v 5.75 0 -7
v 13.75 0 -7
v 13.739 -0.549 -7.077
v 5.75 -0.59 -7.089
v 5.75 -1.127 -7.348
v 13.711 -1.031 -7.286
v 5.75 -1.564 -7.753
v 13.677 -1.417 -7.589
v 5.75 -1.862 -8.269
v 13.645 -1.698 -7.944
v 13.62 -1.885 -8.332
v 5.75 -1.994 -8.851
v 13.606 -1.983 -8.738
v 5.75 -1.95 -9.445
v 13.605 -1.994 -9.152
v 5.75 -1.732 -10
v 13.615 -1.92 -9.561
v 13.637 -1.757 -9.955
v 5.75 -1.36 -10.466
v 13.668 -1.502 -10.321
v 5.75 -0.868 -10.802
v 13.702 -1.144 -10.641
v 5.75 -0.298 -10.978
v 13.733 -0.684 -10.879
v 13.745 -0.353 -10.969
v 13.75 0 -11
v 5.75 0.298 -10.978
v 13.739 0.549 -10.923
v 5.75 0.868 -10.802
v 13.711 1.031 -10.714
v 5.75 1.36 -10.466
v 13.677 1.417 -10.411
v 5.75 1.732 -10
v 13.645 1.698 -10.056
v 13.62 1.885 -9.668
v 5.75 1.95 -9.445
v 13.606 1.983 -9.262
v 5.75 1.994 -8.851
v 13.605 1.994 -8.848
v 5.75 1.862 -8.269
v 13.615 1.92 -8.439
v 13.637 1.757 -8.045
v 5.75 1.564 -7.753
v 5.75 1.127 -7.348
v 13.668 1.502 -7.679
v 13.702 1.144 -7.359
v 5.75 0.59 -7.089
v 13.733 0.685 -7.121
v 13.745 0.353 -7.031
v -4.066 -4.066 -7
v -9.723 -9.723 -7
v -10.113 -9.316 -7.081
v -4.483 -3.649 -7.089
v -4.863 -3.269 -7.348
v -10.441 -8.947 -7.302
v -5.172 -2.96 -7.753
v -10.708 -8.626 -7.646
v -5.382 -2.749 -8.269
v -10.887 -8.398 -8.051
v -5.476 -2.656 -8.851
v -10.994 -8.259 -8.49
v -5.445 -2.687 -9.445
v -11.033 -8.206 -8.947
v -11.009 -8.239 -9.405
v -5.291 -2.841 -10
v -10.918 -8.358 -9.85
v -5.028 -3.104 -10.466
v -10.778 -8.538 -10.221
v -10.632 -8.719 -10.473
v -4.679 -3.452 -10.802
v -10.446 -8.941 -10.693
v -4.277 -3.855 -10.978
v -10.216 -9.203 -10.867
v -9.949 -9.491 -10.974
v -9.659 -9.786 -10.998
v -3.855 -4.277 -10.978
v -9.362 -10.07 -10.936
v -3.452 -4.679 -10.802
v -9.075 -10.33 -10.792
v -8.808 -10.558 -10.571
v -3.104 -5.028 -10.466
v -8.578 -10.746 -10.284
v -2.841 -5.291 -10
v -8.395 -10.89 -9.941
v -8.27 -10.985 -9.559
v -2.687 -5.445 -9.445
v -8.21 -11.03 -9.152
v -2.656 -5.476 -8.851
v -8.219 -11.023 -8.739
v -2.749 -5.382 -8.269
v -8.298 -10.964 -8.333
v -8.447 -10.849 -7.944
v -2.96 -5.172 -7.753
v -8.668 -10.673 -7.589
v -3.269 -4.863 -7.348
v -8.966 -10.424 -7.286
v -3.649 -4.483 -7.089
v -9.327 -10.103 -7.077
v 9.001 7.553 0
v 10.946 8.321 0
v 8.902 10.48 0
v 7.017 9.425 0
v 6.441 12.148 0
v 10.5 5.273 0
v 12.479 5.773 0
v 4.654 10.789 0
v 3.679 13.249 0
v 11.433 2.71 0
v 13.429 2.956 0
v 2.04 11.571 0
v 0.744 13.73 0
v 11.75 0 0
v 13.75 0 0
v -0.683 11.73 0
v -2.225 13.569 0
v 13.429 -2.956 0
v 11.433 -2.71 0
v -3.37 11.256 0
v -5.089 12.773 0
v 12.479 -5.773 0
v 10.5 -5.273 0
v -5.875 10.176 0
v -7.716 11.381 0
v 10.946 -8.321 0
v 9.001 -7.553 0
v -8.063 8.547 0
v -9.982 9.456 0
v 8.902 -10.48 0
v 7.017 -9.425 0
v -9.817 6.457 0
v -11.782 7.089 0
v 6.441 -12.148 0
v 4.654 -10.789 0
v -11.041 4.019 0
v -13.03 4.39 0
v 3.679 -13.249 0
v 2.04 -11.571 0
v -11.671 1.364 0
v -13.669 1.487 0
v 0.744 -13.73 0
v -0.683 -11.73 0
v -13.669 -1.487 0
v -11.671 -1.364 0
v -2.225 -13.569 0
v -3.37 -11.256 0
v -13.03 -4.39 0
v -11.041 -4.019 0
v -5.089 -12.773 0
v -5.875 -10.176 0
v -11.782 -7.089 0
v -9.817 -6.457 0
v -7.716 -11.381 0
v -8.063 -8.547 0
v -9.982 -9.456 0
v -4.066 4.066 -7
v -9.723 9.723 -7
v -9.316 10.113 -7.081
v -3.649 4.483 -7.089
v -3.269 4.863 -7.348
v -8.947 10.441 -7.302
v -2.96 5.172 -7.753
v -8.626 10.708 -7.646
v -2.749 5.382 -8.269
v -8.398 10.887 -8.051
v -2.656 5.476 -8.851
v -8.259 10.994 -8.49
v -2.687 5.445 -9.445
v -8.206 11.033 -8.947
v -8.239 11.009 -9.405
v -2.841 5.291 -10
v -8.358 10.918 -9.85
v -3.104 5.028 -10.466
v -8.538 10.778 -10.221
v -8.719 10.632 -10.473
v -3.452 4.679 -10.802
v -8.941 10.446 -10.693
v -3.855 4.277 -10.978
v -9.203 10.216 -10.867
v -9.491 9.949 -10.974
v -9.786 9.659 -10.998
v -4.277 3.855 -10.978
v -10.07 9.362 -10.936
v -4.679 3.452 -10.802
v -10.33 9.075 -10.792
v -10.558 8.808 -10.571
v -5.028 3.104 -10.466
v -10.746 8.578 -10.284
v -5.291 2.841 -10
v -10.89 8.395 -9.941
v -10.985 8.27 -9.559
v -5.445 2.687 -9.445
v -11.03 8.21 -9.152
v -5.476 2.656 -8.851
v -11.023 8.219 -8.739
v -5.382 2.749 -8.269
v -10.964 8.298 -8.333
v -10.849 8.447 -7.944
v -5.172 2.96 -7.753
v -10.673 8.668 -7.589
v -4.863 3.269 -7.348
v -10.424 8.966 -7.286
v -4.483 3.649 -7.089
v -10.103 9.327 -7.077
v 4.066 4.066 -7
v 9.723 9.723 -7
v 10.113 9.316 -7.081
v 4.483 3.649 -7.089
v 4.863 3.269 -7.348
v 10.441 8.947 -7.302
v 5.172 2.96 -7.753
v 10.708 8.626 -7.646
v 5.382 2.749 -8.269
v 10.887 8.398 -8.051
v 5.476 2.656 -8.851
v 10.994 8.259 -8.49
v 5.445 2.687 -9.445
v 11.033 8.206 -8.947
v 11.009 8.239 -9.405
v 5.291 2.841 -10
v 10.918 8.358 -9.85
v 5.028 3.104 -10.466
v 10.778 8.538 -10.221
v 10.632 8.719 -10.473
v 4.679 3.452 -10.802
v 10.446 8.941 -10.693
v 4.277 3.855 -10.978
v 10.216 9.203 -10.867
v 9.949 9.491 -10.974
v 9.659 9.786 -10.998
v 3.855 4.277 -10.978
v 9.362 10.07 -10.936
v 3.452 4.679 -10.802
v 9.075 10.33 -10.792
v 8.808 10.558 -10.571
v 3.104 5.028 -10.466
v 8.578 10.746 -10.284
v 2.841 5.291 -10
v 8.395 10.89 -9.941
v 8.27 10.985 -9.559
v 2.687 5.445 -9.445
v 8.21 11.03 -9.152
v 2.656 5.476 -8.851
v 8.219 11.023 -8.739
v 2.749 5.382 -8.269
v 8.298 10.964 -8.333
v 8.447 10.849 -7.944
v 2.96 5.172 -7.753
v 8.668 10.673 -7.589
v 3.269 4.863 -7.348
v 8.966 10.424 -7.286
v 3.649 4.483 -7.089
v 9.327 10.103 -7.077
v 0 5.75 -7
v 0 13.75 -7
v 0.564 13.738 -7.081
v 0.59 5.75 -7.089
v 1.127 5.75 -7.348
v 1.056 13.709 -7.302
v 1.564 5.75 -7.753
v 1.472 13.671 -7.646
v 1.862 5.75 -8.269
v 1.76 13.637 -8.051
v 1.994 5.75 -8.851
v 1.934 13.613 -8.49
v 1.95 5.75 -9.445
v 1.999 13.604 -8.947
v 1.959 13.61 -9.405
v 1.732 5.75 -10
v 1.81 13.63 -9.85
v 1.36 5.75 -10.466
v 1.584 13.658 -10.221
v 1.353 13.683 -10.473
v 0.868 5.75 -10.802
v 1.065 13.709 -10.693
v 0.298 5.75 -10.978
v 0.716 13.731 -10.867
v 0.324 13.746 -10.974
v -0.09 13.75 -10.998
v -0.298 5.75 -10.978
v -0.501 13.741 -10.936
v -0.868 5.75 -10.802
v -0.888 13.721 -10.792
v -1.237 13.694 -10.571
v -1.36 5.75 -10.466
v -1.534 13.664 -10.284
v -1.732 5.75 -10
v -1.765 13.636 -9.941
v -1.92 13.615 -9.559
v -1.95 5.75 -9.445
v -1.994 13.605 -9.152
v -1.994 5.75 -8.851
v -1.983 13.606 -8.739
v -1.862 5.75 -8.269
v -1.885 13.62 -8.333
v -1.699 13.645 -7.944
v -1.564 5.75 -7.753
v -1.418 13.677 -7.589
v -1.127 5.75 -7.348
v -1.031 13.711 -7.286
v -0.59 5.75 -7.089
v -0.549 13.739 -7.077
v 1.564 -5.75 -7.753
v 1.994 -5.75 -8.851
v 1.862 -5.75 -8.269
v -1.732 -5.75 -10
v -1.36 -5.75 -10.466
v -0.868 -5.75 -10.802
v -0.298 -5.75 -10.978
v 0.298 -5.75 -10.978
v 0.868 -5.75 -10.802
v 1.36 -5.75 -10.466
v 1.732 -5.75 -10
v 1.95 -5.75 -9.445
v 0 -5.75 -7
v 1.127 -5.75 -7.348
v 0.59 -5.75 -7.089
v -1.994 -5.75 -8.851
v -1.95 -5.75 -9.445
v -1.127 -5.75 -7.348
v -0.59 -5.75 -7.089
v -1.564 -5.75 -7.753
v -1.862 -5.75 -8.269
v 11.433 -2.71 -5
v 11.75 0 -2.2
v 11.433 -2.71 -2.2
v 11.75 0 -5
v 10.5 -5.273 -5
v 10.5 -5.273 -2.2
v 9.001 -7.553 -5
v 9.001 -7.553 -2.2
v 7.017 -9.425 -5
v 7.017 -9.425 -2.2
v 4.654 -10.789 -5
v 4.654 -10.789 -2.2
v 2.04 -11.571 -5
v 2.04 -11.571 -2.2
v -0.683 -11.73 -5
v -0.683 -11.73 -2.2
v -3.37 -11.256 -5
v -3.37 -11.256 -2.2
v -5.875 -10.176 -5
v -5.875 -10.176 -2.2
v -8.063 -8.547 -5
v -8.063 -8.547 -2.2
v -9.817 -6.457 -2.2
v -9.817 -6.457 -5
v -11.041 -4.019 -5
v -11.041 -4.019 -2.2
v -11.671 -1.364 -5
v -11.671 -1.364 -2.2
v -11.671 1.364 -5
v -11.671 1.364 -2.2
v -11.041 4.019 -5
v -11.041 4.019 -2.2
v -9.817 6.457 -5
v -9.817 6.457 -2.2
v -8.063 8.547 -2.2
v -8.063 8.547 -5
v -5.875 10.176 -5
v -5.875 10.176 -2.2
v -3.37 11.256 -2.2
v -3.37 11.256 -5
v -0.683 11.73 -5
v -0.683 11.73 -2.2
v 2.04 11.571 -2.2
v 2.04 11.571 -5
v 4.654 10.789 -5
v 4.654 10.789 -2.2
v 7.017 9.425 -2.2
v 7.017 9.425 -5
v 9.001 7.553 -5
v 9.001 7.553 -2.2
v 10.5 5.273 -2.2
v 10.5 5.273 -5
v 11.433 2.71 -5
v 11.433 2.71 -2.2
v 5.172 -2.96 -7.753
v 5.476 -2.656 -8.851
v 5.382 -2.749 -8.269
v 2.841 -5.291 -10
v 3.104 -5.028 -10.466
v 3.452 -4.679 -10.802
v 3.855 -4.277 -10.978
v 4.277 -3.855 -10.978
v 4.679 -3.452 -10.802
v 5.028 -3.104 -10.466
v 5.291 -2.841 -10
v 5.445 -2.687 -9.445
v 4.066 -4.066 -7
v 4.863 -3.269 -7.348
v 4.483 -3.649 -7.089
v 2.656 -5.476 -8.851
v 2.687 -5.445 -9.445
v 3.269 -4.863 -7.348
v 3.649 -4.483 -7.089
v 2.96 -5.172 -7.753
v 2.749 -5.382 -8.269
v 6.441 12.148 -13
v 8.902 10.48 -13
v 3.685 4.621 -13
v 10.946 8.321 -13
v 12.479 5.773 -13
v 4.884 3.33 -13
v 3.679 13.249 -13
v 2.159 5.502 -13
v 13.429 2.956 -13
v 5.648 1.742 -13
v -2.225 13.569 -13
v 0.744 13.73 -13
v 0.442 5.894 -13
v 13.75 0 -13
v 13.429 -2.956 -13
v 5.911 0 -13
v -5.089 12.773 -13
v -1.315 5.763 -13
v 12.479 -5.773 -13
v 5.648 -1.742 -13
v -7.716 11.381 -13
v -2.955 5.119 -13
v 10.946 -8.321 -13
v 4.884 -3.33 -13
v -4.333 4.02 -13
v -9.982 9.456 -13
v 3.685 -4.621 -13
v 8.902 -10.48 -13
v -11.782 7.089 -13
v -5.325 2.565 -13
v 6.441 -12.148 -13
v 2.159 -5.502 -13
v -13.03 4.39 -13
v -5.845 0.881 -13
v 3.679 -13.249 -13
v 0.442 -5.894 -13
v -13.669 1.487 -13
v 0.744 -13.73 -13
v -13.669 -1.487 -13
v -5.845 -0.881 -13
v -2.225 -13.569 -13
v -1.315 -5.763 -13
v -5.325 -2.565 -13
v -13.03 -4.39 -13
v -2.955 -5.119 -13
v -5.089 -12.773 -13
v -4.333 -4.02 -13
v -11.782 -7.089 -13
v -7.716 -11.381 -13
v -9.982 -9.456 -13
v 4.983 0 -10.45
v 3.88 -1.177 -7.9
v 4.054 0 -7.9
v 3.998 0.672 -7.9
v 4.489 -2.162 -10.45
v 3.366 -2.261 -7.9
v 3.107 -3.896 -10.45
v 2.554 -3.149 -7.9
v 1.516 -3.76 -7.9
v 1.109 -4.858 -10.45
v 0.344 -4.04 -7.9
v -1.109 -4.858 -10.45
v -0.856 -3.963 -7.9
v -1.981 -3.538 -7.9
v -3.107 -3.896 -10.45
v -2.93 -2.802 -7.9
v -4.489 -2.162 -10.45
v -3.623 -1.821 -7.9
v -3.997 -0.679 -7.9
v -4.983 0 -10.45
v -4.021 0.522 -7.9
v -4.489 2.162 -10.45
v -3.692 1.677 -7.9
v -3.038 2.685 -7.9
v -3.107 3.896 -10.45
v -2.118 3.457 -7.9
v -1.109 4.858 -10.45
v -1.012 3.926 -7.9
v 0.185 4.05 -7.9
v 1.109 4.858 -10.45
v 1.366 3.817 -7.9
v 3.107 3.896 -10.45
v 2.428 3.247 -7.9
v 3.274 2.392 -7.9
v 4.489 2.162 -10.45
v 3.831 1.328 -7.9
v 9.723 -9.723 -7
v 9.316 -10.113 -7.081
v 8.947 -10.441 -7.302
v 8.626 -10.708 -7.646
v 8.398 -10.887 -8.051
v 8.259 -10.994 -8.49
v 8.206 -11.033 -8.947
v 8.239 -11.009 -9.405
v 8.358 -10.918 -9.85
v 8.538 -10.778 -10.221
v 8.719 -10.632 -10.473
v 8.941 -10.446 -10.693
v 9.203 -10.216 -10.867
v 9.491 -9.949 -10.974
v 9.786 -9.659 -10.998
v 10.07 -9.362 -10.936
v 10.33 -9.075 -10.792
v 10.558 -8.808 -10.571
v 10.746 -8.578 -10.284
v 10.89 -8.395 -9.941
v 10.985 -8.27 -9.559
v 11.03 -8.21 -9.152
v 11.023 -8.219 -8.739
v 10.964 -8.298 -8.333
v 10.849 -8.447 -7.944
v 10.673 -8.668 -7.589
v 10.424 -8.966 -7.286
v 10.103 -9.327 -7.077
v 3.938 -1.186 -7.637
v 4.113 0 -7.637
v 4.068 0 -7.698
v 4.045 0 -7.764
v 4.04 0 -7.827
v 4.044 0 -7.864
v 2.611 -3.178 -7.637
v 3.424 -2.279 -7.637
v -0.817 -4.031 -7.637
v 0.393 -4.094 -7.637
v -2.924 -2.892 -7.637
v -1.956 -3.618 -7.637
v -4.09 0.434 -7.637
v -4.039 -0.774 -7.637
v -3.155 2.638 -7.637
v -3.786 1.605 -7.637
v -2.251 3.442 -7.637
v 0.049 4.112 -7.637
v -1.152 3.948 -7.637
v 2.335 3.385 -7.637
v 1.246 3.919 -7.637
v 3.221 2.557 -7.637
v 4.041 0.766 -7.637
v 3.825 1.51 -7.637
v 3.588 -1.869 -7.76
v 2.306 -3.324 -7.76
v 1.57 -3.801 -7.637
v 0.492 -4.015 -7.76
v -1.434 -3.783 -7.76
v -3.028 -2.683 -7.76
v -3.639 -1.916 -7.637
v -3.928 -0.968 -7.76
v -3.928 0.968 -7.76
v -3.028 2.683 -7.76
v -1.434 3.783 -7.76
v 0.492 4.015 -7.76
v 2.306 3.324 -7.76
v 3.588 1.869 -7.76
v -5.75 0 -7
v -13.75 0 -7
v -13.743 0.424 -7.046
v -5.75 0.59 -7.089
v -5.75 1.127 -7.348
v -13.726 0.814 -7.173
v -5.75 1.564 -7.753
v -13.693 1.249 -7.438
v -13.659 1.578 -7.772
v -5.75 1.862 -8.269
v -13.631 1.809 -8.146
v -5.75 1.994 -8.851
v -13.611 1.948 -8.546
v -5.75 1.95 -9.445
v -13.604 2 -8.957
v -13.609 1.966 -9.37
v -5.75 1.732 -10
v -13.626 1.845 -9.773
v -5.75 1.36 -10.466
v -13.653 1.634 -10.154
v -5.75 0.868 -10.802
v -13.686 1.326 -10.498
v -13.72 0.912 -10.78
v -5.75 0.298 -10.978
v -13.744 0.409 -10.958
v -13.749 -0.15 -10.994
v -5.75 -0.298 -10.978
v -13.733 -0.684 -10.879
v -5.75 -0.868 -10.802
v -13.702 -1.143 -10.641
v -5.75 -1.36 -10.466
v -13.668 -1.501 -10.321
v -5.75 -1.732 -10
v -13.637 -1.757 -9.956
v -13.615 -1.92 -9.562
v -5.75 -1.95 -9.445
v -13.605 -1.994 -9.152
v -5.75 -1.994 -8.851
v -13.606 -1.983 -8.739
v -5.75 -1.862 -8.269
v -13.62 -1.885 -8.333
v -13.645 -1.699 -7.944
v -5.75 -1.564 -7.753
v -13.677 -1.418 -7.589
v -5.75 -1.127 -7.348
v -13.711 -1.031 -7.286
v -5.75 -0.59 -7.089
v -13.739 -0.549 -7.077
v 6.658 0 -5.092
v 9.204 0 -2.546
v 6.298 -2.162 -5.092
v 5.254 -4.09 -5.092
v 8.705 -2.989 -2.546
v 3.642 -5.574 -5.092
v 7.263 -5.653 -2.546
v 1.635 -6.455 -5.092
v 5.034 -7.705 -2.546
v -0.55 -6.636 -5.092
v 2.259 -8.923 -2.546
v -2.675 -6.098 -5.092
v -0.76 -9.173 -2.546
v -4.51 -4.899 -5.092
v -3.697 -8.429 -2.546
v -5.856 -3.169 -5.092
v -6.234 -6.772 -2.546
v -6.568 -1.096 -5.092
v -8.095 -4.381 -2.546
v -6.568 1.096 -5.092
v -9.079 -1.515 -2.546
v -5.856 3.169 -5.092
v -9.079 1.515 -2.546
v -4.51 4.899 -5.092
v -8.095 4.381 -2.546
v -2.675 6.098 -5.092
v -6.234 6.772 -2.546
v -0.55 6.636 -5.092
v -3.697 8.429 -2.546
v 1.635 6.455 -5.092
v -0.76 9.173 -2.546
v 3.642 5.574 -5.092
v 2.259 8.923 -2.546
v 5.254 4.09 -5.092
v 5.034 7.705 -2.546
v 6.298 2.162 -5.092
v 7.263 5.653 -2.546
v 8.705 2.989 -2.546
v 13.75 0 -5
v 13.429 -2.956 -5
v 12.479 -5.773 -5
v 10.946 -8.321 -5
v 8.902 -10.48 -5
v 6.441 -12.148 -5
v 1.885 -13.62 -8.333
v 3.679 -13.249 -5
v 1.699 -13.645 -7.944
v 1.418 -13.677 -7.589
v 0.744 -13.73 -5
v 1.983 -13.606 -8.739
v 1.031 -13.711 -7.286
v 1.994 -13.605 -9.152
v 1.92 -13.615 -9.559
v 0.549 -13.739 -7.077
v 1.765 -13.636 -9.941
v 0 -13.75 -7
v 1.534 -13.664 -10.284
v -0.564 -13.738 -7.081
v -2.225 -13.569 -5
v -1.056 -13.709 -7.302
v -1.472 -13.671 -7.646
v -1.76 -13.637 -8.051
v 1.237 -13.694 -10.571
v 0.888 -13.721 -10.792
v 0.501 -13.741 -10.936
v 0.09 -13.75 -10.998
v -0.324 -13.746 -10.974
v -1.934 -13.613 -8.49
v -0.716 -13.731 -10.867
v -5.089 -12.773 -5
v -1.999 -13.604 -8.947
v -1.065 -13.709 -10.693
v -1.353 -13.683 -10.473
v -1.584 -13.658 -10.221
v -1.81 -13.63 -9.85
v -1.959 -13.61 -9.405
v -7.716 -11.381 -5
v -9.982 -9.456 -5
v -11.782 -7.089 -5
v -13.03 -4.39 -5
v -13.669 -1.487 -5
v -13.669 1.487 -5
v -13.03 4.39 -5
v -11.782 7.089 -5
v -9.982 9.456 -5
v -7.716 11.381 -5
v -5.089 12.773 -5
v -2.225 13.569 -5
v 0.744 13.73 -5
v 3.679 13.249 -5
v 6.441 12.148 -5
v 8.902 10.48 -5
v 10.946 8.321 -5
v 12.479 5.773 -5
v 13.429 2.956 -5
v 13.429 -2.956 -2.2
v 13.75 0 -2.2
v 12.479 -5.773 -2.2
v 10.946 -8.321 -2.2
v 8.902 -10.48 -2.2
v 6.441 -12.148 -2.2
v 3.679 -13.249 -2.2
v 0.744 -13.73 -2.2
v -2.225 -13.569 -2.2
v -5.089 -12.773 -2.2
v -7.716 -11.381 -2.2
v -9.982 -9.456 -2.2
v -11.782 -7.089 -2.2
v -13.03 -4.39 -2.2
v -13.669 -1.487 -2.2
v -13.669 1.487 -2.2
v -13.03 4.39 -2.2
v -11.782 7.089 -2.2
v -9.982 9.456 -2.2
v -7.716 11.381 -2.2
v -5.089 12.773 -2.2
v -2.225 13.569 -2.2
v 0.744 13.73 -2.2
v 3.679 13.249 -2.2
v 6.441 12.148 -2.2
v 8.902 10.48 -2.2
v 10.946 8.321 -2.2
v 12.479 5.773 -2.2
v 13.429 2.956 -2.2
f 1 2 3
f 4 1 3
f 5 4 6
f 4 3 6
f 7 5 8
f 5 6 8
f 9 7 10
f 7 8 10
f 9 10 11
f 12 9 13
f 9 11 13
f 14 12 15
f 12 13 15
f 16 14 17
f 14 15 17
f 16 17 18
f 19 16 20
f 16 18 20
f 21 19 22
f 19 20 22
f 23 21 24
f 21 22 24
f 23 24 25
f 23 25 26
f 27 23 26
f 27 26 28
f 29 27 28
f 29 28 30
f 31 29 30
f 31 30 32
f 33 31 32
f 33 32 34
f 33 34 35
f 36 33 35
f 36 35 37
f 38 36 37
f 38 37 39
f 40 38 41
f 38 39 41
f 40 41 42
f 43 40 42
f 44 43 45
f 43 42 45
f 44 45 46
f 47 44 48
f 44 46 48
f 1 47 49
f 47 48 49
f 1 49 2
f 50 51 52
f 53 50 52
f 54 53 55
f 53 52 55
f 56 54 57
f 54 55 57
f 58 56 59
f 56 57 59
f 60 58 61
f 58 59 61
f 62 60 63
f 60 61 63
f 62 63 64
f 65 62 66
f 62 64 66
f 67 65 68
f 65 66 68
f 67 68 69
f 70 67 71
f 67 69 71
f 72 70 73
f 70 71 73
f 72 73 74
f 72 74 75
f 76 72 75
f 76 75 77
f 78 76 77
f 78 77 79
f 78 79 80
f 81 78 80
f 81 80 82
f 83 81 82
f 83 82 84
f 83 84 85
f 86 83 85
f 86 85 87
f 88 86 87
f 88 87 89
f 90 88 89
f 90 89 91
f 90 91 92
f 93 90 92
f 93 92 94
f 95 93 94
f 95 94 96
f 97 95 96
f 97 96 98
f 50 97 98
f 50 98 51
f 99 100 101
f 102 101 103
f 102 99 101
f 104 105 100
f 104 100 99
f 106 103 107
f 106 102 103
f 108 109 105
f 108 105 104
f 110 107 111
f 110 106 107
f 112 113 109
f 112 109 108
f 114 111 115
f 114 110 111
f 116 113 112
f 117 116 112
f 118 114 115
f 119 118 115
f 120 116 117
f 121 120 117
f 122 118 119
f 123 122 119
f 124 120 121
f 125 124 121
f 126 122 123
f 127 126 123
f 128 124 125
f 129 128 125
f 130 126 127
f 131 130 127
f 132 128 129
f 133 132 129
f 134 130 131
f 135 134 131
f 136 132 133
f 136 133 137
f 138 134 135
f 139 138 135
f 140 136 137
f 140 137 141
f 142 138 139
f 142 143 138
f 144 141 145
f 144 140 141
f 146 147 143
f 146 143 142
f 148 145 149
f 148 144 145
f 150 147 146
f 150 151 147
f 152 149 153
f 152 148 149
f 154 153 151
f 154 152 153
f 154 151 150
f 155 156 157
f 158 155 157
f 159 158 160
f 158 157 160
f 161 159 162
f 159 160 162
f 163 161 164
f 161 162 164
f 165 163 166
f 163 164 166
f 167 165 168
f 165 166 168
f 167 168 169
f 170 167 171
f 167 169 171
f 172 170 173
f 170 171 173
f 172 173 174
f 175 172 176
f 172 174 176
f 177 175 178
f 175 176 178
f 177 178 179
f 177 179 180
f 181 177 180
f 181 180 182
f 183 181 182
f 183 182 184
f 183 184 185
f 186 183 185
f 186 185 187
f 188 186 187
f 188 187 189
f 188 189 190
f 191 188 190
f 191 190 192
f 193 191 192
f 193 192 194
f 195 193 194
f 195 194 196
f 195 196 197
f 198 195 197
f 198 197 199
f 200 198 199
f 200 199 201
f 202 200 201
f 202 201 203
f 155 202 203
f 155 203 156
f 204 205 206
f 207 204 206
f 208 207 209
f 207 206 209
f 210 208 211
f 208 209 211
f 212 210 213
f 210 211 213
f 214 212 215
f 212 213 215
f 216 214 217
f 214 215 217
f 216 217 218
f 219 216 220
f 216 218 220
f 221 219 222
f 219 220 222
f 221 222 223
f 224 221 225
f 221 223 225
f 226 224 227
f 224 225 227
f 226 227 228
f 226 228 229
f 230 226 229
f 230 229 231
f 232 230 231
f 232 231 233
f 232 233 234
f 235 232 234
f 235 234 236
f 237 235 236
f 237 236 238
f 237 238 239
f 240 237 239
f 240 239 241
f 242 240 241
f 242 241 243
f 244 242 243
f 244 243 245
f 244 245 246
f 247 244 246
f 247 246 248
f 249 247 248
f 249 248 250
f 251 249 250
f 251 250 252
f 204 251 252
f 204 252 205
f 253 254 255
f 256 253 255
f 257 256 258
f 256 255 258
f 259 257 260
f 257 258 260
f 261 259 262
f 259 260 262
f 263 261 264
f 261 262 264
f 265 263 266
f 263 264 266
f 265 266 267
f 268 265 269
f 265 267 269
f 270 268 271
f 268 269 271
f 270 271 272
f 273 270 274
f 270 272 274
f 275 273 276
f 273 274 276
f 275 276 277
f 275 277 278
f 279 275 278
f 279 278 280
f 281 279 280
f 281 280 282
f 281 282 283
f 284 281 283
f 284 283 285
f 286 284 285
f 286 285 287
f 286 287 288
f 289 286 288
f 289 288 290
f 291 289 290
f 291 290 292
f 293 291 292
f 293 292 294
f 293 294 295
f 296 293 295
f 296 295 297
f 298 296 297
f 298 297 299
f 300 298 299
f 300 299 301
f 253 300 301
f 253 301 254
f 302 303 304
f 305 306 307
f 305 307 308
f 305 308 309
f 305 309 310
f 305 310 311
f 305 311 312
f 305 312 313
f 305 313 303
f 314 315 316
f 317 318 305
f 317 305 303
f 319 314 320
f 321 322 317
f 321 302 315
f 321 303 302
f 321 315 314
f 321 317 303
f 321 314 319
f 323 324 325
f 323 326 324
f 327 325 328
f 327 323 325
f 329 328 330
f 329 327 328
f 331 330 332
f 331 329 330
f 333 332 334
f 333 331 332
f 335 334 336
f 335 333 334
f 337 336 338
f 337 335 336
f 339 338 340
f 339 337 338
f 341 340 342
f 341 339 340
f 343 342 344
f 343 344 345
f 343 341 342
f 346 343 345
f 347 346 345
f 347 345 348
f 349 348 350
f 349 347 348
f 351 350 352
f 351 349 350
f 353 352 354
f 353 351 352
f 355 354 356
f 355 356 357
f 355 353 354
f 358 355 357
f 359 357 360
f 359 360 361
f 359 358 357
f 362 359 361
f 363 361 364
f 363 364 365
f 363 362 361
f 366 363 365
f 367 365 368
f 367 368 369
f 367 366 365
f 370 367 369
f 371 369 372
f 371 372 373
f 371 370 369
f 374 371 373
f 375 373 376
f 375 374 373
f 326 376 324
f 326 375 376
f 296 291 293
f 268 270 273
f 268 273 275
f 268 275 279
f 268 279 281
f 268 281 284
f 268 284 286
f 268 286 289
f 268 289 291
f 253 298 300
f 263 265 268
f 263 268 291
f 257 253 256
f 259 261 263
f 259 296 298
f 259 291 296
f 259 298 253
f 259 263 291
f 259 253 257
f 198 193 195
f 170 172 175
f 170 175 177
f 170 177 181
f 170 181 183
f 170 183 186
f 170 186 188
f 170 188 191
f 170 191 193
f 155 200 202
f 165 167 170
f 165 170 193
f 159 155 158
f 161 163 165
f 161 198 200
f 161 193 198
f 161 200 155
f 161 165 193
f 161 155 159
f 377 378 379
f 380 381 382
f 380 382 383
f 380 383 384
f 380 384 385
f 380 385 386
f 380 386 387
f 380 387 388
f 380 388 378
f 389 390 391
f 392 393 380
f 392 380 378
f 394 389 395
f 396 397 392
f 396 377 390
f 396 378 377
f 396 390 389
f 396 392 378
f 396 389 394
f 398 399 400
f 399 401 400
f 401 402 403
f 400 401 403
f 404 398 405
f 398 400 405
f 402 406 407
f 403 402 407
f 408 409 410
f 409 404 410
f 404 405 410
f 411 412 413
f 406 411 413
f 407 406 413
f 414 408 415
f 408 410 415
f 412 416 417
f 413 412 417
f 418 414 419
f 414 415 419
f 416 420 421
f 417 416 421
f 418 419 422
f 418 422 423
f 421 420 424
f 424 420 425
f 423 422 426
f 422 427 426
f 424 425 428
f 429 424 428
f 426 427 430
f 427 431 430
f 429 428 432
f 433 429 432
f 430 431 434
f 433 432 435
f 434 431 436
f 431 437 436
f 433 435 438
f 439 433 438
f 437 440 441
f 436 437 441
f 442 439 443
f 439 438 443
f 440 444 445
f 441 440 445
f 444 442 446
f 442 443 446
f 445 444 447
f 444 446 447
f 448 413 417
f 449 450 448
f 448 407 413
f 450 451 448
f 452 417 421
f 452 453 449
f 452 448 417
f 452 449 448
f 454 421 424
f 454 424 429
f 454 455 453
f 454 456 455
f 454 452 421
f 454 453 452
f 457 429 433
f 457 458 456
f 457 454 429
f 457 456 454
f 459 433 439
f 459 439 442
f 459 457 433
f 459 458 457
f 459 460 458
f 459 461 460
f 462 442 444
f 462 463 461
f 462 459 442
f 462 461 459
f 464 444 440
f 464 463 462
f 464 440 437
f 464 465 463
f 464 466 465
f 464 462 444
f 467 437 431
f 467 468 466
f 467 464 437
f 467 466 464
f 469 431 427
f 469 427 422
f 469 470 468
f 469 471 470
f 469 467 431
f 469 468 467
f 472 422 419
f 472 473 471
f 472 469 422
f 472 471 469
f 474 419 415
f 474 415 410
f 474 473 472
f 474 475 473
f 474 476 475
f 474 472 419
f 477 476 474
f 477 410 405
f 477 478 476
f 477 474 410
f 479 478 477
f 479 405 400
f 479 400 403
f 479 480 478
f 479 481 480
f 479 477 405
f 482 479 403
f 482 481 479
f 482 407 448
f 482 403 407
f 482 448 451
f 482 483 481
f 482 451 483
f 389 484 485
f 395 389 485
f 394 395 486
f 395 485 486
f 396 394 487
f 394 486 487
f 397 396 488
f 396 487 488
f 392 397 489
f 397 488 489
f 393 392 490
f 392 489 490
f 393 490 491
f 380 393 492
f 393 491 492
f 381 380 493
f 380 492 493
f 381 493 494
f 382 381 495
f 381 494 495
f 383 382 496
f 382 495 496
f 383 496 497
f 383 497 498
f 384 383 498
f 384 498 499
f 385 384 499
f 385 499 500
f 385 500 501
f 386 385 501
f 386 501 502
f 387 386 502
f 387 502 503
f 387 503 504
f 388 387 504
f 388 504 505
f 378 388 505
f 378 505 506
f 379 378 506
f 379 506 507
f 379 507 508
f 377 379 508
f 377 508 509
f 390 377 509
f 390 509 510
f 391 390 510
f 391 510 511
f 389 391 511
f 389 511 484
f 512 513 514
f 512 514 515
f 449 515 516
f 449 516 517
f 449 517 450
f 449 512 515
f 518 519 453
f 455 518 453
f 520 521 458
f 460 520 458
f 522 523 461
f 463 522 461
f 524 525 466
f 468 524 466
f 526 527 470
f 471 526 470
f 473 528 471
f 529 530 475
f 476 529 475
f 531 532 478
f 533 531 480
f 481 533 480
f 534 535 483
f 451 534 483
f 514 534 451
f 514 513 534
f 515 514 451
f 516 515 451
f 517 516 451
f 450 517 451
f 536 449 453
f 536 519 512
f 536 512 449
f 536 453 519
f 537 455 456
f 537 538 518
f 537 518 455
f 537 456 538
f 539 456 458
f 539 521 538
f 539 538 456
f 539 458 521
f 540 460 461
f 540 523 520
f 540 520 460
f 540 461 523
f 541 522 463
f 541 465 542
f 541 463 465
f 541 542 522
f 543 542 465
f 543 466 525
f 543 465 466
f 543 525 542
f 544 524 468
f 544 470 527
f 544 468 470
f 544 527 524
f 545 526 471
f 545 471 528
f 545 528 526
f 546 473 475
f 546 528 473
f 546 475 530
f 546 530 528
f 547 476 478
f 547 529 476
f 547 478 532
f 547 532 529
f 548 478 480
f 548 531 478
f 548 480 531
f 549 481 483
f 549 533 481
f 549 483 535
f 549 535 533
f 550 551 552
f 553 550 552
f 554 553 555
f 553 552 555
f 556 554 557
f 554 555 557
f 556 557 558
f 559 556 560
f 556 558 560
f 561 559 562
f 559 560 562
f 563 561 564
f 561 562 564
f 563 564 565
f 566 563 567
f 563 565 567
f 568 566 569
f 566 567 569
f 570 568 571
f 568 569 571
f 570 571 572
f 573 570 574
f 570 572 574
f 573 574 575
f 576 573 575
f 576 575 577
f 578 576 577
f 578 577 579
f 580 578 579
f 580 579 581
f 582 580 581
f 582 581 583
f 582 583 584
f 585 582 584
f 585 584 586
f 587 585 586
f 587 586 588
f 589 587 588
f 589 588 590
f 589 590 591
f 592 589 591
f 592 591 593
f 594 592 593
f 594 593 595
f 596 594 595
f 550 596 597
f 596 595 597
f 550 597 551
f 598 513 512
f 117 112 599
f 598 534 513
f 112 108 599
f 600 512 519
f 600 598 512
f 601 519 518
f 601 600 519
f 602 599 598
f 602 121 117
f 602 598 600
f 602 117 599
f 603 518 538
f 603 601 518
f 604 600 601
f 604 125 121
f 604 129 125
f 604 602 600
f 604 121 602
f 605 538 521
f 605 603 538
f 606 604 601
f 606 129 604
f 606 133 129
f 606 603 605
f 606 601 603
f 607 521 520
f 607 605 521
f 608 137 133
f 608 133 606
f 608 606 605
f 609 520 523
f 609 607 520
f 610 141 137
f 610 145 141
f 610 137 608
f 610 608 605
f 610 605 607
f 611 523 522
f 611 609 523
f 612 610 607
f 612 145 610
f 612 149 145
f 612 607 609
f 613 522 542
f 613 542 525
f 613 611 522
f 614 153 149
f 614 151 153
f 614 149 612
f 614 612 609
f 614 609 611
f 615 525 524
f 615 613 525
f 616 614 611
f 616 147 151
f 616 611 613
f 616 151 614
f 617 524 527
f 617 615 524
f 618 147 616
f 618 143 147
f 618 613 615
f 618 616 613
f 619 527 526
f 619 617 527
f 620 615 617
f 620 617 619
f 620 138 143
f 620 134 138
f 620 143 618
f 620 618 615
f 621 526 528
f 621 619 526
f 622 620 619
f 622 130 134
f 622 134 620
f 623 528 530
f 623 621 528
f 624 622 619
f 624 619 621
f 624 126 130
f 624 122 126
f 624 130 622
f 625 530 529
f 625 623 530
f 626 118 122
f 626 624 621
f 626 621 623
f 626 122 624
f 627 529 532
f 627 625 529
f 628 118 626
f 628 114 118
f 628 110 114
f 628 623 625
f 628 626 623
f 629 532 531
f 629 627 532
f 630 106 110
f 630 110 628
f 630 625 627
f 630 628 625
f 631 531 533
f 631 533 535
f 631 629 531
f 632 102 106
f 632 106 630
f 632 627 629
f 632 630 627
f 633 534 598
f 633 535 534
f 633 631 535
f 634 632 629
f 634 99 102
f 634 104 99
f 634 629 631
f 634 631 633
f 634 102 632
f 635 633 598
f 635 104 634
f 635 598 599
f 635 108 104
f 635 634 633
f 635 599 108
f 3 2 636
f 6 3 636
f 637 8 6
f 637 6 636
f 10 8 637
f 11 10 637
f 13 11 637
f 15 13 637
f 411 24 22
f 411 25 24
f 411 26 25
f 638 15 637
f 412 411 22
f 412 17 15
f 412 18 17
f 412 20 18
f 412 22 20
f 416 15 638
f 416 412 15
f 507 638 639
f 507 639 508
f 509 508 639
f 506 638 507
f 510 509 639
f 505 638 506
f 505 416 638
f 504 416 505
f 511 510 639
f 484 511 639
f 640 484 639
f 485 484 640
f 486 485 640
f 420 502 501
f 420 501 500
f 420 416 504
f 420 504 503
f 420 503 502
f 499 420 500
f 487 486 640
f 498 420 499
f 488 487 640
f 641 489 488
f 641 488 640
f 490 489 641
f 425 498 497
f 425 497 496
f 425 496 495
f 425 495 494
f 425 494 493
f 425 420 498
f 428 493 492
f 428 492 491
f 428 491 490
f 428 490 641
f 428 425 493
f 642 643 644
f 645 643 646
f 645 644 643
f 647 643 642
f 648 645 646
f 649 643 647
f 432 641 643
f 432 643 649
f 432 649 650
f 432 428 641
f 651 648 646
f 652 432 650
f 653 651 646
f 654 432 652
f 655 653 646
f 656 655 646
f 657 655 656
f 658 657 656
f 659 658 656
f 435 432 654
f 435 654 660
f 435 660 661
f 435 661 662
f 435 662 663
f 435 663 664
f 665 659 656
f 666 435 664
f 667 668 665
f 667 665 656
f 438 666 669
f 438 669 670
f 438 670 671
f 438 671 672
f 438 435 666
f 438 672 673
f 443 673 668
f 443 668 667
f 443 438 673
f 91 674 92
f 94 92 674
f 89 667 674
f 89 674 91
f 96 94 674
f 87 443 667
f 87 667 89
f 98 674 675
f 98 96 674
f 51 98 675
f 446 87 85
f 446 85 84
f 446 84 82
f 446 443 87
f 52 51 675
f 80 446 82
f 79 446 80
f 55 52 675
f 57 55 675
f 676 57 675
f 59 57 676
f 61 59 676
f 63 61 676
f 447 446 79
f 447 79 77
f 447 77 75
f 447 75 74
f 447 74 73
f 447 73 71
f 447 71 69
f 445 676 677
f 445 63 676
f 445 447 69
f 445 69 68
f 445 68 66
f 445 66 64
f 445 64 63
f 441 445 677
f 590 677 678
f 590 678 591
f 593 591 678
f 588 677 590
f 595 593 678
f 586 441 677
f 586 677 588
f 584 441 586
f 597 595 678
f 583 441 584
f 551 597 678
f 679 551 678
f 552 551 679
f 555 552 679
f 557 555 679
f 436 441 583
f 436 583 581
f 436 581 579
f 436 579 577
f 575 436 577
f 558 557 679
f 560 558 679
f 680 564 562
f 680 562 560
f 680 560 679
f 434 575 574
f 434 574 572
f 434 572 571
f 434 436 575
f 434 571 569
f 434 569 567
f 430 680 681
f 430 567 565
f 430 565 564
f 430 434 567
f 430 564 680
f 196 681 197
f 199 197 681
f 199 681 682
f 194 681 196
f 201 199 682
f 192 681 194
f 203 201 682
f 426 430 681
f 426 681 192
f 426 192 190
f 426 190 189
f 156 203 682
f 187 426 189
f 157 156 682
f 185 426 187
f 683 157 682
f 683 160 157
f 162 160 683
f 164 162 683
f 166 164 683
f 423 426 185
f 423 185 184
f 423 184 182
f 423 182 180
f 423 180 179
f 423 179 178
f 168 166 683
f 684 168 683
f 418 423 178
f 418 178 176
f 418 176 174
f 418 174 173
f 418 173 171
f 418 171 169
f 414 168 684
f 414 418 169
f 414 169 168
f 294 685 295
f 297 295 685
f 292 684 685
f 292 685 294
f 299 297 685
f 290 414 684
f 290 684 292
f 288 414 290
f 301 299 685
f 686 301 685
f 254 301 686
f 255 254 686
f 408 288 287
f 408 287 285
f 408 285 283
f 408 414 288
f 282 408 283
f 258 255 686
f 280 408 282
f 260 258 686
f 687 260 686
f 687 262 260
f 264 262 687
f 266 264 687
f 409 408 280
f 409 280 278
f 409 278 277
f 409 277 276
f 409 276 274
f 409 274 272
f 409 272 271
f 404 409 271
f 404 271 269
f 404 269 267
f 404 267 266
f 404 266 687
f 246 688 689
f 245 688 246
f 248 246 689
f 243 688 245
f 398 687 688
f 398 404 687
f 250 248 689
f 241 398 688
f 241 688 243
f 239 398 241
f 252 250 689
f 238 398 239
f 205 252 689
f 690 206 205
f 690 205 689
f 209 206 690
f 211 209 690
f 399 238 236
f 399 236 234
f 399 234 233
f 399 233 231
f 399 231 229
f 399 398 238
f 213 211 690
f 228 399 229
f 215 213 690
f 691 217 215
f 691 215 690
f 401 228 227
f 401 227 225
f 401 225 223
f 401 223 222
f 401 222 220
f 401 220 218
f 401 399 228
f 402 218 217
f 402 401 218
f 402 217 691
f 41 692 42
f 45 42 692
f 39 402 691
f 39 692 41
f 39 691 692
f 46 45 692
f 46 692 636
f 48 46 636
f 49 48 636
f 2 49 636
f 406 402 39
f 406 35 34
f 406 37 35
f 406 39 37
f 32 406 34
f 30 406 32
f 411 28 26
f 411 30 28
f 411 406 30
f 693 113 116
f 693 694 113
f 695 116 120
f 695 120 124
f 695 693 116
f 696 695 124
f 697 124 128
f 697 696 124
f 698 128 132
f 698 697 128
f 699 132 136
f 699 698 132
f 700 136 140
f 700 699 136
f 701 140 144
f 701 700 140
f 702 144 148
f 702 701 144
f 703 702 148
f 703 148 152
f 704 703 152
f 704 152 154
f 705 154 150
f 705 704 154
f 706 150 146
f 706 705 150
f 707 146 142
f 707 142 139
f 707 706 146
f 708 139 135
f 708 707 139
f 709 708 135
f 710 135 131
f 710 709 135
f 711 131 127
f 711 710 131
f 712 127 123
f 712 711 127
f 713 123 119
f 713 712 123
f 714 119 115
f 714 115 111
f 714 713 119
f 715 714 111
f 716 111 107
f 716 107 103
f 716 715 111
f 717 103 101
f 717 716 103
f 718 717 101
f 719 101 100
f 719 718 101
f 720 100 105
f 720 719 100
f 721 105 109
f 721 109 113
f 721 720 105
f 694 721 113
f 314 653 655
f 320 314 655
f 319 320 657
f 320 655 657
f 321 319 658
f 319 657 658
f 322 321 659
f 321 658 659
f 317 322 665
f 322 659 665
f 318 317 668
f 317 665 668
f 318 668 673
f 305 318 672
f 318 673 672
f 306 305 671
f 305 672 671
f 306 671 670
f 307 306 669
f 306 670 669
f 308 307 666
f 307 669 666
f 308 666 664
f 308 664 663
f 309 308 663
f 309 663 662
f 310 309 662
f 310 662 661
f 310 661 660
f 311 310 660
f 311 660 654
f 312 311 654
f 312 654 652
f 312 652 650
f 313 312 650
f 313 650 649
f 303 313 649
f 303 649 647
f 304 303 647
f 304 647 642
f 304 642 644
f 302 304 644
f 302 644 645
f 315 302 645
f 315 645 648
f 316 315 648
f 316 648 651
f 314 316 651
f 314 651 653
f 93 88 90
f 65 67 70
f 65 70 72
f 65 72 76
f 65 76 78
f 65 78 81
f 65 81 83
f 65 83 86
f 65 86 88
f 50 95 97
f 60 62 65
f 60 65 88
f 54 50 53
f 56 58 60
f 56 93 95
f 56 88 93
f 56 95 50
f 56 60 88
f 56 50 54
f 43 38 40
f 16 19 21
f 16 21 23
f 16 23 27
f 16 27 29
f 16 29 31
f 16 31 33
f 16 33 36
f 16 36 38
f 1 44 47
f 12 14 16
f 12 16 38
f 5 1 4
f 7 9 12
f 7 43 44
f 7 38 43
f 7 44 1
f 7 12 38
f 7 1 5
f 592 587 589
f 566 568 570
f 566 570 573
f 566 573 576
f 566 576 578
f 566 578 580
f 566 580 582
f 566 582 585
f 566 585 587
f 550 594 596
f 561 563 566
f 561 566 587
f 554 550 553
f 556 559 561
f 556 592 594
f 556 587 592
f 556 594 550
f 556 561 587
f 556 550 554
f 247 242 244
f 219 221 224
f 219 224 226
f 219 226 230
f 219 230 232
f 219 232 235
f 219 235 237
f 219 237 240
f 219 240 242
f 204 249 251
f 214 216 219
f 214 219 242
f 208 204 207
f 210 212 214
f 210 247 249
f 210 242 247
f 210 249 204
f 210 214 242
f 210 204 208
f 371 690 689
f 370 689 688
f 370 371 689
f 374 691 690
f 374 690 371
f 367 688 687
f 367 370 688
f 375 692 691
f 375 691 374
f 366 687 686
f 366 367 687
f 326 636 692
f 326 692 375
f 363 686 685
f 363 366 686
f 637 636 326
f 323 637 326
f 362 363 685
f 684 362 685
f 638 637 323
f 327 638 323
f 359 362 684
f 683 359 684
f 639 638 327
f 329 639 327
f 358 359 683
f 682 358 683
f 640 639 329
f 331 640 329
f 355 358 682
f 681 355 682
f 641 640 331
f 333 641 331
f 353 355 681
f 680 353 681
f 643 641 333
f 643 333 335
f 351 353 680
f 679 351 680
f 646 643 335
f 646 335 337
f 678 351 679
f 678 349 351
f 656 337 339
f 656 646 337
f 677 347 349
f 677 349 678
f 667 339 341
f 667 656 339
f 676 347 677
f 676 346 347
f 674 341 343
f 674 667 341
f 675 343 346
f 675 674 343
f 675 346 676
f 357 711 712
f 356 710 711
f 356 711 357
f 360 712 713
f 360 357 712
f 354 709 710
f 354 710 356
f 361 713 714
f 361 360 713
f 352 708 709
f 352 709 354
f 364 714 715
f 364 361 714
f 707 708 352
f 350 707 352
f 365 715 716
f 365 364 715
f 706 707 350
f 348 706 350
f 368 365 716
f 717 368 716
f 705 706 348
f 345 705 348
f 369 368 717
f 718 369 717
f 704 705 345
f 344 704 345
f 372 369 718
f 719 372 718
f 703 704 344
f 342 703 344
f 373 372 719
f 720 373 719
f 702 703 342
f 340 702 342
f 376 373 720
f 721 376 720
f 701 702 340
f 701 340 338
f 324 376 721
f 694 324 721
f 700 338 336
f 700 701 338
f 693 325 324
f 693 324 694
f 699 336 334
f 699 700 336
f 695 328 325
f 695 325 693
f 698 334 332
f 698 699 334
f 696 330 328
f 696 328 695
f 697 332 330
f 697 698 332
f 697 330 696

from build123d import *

# Parameters (mm, degrees)
ESBO_O3_R             = 2
CORTE_EXTRUS_O1_DEPTH = 8
PADR_OCIRCULAR1_COUNT = 8
FILETE2_R             = 0.25


with BuildPart() as part:
    # Esboço2 → Revolução1 (revolve)
    with BuildSketch(Plane(origin=(0, 0, 0), x_dir=(1, 0, 0), z_dir=(0, 1, 0))):
        Polygon((0, 0), (-13.75, 0), (-13.75, 2.2), (-11.75, 2.2), (-11.75, 5), (-13.75, 5), (-13.75, 13), (-11.75, 13), (0, 13), align=None)
    revolve(axis=Axis((0, 0, 0), (0, 0, -1)))

    # Esboço3 → Corte-extrusão1 (cut)
    with BuildSketch(Plane(origin=(0, 13.75, 0), x_dir=(1, 0, 0), z_dir=(0, 1, 0))):
        with Locations((0, 9)):
            Circle(ESBO_O3_R)
    corte_extrus_o1 = extrude(amount=-CORTE_EXTRUS_O1_DEPTH, mode=Mode.SUBTRACT)

    # PadrãoCircular1: Corte-extrusão1 ×8 about axis
    padr_ocircular1_axis = Axis((0, 0, 0), (0, 0, -1))
    for i in range(1, PADR_OCIRCULAR1_COUNT):
        add(corte_extrus_o1.rotate(padr_ocircular1_axis, i * 360 / PADR_OCIRCULAR1_COUNT), mode=Mode.SUBTRACT)

    # Esboço12 → Corte-Revolução1 (revolve, cut)
    with BuildSketch(Plane(origin=(0, 0, 0), x_dir=(1, 0, 0), z_dir=(0, 1, 0))):
        Polygon((-4, 7.75), (-11.75, 0), (-2.977226814, 0), (0, 0), (0, 13), (-2.977226814, 13), (-5.91084373, 13), align=None)
    revolve(axis=Axis((0, 0, 0), (0, 0, -1)), mode=Mode.SUBTRACT)

    # Filete2
    filete2_edges = [part.edges().sort_by_distance(p)[0] for p in [
        (4, 0, -7.75),
    ]]
    fillet(filete2_edges, radius=FILETE2_R)


solid = part.part
